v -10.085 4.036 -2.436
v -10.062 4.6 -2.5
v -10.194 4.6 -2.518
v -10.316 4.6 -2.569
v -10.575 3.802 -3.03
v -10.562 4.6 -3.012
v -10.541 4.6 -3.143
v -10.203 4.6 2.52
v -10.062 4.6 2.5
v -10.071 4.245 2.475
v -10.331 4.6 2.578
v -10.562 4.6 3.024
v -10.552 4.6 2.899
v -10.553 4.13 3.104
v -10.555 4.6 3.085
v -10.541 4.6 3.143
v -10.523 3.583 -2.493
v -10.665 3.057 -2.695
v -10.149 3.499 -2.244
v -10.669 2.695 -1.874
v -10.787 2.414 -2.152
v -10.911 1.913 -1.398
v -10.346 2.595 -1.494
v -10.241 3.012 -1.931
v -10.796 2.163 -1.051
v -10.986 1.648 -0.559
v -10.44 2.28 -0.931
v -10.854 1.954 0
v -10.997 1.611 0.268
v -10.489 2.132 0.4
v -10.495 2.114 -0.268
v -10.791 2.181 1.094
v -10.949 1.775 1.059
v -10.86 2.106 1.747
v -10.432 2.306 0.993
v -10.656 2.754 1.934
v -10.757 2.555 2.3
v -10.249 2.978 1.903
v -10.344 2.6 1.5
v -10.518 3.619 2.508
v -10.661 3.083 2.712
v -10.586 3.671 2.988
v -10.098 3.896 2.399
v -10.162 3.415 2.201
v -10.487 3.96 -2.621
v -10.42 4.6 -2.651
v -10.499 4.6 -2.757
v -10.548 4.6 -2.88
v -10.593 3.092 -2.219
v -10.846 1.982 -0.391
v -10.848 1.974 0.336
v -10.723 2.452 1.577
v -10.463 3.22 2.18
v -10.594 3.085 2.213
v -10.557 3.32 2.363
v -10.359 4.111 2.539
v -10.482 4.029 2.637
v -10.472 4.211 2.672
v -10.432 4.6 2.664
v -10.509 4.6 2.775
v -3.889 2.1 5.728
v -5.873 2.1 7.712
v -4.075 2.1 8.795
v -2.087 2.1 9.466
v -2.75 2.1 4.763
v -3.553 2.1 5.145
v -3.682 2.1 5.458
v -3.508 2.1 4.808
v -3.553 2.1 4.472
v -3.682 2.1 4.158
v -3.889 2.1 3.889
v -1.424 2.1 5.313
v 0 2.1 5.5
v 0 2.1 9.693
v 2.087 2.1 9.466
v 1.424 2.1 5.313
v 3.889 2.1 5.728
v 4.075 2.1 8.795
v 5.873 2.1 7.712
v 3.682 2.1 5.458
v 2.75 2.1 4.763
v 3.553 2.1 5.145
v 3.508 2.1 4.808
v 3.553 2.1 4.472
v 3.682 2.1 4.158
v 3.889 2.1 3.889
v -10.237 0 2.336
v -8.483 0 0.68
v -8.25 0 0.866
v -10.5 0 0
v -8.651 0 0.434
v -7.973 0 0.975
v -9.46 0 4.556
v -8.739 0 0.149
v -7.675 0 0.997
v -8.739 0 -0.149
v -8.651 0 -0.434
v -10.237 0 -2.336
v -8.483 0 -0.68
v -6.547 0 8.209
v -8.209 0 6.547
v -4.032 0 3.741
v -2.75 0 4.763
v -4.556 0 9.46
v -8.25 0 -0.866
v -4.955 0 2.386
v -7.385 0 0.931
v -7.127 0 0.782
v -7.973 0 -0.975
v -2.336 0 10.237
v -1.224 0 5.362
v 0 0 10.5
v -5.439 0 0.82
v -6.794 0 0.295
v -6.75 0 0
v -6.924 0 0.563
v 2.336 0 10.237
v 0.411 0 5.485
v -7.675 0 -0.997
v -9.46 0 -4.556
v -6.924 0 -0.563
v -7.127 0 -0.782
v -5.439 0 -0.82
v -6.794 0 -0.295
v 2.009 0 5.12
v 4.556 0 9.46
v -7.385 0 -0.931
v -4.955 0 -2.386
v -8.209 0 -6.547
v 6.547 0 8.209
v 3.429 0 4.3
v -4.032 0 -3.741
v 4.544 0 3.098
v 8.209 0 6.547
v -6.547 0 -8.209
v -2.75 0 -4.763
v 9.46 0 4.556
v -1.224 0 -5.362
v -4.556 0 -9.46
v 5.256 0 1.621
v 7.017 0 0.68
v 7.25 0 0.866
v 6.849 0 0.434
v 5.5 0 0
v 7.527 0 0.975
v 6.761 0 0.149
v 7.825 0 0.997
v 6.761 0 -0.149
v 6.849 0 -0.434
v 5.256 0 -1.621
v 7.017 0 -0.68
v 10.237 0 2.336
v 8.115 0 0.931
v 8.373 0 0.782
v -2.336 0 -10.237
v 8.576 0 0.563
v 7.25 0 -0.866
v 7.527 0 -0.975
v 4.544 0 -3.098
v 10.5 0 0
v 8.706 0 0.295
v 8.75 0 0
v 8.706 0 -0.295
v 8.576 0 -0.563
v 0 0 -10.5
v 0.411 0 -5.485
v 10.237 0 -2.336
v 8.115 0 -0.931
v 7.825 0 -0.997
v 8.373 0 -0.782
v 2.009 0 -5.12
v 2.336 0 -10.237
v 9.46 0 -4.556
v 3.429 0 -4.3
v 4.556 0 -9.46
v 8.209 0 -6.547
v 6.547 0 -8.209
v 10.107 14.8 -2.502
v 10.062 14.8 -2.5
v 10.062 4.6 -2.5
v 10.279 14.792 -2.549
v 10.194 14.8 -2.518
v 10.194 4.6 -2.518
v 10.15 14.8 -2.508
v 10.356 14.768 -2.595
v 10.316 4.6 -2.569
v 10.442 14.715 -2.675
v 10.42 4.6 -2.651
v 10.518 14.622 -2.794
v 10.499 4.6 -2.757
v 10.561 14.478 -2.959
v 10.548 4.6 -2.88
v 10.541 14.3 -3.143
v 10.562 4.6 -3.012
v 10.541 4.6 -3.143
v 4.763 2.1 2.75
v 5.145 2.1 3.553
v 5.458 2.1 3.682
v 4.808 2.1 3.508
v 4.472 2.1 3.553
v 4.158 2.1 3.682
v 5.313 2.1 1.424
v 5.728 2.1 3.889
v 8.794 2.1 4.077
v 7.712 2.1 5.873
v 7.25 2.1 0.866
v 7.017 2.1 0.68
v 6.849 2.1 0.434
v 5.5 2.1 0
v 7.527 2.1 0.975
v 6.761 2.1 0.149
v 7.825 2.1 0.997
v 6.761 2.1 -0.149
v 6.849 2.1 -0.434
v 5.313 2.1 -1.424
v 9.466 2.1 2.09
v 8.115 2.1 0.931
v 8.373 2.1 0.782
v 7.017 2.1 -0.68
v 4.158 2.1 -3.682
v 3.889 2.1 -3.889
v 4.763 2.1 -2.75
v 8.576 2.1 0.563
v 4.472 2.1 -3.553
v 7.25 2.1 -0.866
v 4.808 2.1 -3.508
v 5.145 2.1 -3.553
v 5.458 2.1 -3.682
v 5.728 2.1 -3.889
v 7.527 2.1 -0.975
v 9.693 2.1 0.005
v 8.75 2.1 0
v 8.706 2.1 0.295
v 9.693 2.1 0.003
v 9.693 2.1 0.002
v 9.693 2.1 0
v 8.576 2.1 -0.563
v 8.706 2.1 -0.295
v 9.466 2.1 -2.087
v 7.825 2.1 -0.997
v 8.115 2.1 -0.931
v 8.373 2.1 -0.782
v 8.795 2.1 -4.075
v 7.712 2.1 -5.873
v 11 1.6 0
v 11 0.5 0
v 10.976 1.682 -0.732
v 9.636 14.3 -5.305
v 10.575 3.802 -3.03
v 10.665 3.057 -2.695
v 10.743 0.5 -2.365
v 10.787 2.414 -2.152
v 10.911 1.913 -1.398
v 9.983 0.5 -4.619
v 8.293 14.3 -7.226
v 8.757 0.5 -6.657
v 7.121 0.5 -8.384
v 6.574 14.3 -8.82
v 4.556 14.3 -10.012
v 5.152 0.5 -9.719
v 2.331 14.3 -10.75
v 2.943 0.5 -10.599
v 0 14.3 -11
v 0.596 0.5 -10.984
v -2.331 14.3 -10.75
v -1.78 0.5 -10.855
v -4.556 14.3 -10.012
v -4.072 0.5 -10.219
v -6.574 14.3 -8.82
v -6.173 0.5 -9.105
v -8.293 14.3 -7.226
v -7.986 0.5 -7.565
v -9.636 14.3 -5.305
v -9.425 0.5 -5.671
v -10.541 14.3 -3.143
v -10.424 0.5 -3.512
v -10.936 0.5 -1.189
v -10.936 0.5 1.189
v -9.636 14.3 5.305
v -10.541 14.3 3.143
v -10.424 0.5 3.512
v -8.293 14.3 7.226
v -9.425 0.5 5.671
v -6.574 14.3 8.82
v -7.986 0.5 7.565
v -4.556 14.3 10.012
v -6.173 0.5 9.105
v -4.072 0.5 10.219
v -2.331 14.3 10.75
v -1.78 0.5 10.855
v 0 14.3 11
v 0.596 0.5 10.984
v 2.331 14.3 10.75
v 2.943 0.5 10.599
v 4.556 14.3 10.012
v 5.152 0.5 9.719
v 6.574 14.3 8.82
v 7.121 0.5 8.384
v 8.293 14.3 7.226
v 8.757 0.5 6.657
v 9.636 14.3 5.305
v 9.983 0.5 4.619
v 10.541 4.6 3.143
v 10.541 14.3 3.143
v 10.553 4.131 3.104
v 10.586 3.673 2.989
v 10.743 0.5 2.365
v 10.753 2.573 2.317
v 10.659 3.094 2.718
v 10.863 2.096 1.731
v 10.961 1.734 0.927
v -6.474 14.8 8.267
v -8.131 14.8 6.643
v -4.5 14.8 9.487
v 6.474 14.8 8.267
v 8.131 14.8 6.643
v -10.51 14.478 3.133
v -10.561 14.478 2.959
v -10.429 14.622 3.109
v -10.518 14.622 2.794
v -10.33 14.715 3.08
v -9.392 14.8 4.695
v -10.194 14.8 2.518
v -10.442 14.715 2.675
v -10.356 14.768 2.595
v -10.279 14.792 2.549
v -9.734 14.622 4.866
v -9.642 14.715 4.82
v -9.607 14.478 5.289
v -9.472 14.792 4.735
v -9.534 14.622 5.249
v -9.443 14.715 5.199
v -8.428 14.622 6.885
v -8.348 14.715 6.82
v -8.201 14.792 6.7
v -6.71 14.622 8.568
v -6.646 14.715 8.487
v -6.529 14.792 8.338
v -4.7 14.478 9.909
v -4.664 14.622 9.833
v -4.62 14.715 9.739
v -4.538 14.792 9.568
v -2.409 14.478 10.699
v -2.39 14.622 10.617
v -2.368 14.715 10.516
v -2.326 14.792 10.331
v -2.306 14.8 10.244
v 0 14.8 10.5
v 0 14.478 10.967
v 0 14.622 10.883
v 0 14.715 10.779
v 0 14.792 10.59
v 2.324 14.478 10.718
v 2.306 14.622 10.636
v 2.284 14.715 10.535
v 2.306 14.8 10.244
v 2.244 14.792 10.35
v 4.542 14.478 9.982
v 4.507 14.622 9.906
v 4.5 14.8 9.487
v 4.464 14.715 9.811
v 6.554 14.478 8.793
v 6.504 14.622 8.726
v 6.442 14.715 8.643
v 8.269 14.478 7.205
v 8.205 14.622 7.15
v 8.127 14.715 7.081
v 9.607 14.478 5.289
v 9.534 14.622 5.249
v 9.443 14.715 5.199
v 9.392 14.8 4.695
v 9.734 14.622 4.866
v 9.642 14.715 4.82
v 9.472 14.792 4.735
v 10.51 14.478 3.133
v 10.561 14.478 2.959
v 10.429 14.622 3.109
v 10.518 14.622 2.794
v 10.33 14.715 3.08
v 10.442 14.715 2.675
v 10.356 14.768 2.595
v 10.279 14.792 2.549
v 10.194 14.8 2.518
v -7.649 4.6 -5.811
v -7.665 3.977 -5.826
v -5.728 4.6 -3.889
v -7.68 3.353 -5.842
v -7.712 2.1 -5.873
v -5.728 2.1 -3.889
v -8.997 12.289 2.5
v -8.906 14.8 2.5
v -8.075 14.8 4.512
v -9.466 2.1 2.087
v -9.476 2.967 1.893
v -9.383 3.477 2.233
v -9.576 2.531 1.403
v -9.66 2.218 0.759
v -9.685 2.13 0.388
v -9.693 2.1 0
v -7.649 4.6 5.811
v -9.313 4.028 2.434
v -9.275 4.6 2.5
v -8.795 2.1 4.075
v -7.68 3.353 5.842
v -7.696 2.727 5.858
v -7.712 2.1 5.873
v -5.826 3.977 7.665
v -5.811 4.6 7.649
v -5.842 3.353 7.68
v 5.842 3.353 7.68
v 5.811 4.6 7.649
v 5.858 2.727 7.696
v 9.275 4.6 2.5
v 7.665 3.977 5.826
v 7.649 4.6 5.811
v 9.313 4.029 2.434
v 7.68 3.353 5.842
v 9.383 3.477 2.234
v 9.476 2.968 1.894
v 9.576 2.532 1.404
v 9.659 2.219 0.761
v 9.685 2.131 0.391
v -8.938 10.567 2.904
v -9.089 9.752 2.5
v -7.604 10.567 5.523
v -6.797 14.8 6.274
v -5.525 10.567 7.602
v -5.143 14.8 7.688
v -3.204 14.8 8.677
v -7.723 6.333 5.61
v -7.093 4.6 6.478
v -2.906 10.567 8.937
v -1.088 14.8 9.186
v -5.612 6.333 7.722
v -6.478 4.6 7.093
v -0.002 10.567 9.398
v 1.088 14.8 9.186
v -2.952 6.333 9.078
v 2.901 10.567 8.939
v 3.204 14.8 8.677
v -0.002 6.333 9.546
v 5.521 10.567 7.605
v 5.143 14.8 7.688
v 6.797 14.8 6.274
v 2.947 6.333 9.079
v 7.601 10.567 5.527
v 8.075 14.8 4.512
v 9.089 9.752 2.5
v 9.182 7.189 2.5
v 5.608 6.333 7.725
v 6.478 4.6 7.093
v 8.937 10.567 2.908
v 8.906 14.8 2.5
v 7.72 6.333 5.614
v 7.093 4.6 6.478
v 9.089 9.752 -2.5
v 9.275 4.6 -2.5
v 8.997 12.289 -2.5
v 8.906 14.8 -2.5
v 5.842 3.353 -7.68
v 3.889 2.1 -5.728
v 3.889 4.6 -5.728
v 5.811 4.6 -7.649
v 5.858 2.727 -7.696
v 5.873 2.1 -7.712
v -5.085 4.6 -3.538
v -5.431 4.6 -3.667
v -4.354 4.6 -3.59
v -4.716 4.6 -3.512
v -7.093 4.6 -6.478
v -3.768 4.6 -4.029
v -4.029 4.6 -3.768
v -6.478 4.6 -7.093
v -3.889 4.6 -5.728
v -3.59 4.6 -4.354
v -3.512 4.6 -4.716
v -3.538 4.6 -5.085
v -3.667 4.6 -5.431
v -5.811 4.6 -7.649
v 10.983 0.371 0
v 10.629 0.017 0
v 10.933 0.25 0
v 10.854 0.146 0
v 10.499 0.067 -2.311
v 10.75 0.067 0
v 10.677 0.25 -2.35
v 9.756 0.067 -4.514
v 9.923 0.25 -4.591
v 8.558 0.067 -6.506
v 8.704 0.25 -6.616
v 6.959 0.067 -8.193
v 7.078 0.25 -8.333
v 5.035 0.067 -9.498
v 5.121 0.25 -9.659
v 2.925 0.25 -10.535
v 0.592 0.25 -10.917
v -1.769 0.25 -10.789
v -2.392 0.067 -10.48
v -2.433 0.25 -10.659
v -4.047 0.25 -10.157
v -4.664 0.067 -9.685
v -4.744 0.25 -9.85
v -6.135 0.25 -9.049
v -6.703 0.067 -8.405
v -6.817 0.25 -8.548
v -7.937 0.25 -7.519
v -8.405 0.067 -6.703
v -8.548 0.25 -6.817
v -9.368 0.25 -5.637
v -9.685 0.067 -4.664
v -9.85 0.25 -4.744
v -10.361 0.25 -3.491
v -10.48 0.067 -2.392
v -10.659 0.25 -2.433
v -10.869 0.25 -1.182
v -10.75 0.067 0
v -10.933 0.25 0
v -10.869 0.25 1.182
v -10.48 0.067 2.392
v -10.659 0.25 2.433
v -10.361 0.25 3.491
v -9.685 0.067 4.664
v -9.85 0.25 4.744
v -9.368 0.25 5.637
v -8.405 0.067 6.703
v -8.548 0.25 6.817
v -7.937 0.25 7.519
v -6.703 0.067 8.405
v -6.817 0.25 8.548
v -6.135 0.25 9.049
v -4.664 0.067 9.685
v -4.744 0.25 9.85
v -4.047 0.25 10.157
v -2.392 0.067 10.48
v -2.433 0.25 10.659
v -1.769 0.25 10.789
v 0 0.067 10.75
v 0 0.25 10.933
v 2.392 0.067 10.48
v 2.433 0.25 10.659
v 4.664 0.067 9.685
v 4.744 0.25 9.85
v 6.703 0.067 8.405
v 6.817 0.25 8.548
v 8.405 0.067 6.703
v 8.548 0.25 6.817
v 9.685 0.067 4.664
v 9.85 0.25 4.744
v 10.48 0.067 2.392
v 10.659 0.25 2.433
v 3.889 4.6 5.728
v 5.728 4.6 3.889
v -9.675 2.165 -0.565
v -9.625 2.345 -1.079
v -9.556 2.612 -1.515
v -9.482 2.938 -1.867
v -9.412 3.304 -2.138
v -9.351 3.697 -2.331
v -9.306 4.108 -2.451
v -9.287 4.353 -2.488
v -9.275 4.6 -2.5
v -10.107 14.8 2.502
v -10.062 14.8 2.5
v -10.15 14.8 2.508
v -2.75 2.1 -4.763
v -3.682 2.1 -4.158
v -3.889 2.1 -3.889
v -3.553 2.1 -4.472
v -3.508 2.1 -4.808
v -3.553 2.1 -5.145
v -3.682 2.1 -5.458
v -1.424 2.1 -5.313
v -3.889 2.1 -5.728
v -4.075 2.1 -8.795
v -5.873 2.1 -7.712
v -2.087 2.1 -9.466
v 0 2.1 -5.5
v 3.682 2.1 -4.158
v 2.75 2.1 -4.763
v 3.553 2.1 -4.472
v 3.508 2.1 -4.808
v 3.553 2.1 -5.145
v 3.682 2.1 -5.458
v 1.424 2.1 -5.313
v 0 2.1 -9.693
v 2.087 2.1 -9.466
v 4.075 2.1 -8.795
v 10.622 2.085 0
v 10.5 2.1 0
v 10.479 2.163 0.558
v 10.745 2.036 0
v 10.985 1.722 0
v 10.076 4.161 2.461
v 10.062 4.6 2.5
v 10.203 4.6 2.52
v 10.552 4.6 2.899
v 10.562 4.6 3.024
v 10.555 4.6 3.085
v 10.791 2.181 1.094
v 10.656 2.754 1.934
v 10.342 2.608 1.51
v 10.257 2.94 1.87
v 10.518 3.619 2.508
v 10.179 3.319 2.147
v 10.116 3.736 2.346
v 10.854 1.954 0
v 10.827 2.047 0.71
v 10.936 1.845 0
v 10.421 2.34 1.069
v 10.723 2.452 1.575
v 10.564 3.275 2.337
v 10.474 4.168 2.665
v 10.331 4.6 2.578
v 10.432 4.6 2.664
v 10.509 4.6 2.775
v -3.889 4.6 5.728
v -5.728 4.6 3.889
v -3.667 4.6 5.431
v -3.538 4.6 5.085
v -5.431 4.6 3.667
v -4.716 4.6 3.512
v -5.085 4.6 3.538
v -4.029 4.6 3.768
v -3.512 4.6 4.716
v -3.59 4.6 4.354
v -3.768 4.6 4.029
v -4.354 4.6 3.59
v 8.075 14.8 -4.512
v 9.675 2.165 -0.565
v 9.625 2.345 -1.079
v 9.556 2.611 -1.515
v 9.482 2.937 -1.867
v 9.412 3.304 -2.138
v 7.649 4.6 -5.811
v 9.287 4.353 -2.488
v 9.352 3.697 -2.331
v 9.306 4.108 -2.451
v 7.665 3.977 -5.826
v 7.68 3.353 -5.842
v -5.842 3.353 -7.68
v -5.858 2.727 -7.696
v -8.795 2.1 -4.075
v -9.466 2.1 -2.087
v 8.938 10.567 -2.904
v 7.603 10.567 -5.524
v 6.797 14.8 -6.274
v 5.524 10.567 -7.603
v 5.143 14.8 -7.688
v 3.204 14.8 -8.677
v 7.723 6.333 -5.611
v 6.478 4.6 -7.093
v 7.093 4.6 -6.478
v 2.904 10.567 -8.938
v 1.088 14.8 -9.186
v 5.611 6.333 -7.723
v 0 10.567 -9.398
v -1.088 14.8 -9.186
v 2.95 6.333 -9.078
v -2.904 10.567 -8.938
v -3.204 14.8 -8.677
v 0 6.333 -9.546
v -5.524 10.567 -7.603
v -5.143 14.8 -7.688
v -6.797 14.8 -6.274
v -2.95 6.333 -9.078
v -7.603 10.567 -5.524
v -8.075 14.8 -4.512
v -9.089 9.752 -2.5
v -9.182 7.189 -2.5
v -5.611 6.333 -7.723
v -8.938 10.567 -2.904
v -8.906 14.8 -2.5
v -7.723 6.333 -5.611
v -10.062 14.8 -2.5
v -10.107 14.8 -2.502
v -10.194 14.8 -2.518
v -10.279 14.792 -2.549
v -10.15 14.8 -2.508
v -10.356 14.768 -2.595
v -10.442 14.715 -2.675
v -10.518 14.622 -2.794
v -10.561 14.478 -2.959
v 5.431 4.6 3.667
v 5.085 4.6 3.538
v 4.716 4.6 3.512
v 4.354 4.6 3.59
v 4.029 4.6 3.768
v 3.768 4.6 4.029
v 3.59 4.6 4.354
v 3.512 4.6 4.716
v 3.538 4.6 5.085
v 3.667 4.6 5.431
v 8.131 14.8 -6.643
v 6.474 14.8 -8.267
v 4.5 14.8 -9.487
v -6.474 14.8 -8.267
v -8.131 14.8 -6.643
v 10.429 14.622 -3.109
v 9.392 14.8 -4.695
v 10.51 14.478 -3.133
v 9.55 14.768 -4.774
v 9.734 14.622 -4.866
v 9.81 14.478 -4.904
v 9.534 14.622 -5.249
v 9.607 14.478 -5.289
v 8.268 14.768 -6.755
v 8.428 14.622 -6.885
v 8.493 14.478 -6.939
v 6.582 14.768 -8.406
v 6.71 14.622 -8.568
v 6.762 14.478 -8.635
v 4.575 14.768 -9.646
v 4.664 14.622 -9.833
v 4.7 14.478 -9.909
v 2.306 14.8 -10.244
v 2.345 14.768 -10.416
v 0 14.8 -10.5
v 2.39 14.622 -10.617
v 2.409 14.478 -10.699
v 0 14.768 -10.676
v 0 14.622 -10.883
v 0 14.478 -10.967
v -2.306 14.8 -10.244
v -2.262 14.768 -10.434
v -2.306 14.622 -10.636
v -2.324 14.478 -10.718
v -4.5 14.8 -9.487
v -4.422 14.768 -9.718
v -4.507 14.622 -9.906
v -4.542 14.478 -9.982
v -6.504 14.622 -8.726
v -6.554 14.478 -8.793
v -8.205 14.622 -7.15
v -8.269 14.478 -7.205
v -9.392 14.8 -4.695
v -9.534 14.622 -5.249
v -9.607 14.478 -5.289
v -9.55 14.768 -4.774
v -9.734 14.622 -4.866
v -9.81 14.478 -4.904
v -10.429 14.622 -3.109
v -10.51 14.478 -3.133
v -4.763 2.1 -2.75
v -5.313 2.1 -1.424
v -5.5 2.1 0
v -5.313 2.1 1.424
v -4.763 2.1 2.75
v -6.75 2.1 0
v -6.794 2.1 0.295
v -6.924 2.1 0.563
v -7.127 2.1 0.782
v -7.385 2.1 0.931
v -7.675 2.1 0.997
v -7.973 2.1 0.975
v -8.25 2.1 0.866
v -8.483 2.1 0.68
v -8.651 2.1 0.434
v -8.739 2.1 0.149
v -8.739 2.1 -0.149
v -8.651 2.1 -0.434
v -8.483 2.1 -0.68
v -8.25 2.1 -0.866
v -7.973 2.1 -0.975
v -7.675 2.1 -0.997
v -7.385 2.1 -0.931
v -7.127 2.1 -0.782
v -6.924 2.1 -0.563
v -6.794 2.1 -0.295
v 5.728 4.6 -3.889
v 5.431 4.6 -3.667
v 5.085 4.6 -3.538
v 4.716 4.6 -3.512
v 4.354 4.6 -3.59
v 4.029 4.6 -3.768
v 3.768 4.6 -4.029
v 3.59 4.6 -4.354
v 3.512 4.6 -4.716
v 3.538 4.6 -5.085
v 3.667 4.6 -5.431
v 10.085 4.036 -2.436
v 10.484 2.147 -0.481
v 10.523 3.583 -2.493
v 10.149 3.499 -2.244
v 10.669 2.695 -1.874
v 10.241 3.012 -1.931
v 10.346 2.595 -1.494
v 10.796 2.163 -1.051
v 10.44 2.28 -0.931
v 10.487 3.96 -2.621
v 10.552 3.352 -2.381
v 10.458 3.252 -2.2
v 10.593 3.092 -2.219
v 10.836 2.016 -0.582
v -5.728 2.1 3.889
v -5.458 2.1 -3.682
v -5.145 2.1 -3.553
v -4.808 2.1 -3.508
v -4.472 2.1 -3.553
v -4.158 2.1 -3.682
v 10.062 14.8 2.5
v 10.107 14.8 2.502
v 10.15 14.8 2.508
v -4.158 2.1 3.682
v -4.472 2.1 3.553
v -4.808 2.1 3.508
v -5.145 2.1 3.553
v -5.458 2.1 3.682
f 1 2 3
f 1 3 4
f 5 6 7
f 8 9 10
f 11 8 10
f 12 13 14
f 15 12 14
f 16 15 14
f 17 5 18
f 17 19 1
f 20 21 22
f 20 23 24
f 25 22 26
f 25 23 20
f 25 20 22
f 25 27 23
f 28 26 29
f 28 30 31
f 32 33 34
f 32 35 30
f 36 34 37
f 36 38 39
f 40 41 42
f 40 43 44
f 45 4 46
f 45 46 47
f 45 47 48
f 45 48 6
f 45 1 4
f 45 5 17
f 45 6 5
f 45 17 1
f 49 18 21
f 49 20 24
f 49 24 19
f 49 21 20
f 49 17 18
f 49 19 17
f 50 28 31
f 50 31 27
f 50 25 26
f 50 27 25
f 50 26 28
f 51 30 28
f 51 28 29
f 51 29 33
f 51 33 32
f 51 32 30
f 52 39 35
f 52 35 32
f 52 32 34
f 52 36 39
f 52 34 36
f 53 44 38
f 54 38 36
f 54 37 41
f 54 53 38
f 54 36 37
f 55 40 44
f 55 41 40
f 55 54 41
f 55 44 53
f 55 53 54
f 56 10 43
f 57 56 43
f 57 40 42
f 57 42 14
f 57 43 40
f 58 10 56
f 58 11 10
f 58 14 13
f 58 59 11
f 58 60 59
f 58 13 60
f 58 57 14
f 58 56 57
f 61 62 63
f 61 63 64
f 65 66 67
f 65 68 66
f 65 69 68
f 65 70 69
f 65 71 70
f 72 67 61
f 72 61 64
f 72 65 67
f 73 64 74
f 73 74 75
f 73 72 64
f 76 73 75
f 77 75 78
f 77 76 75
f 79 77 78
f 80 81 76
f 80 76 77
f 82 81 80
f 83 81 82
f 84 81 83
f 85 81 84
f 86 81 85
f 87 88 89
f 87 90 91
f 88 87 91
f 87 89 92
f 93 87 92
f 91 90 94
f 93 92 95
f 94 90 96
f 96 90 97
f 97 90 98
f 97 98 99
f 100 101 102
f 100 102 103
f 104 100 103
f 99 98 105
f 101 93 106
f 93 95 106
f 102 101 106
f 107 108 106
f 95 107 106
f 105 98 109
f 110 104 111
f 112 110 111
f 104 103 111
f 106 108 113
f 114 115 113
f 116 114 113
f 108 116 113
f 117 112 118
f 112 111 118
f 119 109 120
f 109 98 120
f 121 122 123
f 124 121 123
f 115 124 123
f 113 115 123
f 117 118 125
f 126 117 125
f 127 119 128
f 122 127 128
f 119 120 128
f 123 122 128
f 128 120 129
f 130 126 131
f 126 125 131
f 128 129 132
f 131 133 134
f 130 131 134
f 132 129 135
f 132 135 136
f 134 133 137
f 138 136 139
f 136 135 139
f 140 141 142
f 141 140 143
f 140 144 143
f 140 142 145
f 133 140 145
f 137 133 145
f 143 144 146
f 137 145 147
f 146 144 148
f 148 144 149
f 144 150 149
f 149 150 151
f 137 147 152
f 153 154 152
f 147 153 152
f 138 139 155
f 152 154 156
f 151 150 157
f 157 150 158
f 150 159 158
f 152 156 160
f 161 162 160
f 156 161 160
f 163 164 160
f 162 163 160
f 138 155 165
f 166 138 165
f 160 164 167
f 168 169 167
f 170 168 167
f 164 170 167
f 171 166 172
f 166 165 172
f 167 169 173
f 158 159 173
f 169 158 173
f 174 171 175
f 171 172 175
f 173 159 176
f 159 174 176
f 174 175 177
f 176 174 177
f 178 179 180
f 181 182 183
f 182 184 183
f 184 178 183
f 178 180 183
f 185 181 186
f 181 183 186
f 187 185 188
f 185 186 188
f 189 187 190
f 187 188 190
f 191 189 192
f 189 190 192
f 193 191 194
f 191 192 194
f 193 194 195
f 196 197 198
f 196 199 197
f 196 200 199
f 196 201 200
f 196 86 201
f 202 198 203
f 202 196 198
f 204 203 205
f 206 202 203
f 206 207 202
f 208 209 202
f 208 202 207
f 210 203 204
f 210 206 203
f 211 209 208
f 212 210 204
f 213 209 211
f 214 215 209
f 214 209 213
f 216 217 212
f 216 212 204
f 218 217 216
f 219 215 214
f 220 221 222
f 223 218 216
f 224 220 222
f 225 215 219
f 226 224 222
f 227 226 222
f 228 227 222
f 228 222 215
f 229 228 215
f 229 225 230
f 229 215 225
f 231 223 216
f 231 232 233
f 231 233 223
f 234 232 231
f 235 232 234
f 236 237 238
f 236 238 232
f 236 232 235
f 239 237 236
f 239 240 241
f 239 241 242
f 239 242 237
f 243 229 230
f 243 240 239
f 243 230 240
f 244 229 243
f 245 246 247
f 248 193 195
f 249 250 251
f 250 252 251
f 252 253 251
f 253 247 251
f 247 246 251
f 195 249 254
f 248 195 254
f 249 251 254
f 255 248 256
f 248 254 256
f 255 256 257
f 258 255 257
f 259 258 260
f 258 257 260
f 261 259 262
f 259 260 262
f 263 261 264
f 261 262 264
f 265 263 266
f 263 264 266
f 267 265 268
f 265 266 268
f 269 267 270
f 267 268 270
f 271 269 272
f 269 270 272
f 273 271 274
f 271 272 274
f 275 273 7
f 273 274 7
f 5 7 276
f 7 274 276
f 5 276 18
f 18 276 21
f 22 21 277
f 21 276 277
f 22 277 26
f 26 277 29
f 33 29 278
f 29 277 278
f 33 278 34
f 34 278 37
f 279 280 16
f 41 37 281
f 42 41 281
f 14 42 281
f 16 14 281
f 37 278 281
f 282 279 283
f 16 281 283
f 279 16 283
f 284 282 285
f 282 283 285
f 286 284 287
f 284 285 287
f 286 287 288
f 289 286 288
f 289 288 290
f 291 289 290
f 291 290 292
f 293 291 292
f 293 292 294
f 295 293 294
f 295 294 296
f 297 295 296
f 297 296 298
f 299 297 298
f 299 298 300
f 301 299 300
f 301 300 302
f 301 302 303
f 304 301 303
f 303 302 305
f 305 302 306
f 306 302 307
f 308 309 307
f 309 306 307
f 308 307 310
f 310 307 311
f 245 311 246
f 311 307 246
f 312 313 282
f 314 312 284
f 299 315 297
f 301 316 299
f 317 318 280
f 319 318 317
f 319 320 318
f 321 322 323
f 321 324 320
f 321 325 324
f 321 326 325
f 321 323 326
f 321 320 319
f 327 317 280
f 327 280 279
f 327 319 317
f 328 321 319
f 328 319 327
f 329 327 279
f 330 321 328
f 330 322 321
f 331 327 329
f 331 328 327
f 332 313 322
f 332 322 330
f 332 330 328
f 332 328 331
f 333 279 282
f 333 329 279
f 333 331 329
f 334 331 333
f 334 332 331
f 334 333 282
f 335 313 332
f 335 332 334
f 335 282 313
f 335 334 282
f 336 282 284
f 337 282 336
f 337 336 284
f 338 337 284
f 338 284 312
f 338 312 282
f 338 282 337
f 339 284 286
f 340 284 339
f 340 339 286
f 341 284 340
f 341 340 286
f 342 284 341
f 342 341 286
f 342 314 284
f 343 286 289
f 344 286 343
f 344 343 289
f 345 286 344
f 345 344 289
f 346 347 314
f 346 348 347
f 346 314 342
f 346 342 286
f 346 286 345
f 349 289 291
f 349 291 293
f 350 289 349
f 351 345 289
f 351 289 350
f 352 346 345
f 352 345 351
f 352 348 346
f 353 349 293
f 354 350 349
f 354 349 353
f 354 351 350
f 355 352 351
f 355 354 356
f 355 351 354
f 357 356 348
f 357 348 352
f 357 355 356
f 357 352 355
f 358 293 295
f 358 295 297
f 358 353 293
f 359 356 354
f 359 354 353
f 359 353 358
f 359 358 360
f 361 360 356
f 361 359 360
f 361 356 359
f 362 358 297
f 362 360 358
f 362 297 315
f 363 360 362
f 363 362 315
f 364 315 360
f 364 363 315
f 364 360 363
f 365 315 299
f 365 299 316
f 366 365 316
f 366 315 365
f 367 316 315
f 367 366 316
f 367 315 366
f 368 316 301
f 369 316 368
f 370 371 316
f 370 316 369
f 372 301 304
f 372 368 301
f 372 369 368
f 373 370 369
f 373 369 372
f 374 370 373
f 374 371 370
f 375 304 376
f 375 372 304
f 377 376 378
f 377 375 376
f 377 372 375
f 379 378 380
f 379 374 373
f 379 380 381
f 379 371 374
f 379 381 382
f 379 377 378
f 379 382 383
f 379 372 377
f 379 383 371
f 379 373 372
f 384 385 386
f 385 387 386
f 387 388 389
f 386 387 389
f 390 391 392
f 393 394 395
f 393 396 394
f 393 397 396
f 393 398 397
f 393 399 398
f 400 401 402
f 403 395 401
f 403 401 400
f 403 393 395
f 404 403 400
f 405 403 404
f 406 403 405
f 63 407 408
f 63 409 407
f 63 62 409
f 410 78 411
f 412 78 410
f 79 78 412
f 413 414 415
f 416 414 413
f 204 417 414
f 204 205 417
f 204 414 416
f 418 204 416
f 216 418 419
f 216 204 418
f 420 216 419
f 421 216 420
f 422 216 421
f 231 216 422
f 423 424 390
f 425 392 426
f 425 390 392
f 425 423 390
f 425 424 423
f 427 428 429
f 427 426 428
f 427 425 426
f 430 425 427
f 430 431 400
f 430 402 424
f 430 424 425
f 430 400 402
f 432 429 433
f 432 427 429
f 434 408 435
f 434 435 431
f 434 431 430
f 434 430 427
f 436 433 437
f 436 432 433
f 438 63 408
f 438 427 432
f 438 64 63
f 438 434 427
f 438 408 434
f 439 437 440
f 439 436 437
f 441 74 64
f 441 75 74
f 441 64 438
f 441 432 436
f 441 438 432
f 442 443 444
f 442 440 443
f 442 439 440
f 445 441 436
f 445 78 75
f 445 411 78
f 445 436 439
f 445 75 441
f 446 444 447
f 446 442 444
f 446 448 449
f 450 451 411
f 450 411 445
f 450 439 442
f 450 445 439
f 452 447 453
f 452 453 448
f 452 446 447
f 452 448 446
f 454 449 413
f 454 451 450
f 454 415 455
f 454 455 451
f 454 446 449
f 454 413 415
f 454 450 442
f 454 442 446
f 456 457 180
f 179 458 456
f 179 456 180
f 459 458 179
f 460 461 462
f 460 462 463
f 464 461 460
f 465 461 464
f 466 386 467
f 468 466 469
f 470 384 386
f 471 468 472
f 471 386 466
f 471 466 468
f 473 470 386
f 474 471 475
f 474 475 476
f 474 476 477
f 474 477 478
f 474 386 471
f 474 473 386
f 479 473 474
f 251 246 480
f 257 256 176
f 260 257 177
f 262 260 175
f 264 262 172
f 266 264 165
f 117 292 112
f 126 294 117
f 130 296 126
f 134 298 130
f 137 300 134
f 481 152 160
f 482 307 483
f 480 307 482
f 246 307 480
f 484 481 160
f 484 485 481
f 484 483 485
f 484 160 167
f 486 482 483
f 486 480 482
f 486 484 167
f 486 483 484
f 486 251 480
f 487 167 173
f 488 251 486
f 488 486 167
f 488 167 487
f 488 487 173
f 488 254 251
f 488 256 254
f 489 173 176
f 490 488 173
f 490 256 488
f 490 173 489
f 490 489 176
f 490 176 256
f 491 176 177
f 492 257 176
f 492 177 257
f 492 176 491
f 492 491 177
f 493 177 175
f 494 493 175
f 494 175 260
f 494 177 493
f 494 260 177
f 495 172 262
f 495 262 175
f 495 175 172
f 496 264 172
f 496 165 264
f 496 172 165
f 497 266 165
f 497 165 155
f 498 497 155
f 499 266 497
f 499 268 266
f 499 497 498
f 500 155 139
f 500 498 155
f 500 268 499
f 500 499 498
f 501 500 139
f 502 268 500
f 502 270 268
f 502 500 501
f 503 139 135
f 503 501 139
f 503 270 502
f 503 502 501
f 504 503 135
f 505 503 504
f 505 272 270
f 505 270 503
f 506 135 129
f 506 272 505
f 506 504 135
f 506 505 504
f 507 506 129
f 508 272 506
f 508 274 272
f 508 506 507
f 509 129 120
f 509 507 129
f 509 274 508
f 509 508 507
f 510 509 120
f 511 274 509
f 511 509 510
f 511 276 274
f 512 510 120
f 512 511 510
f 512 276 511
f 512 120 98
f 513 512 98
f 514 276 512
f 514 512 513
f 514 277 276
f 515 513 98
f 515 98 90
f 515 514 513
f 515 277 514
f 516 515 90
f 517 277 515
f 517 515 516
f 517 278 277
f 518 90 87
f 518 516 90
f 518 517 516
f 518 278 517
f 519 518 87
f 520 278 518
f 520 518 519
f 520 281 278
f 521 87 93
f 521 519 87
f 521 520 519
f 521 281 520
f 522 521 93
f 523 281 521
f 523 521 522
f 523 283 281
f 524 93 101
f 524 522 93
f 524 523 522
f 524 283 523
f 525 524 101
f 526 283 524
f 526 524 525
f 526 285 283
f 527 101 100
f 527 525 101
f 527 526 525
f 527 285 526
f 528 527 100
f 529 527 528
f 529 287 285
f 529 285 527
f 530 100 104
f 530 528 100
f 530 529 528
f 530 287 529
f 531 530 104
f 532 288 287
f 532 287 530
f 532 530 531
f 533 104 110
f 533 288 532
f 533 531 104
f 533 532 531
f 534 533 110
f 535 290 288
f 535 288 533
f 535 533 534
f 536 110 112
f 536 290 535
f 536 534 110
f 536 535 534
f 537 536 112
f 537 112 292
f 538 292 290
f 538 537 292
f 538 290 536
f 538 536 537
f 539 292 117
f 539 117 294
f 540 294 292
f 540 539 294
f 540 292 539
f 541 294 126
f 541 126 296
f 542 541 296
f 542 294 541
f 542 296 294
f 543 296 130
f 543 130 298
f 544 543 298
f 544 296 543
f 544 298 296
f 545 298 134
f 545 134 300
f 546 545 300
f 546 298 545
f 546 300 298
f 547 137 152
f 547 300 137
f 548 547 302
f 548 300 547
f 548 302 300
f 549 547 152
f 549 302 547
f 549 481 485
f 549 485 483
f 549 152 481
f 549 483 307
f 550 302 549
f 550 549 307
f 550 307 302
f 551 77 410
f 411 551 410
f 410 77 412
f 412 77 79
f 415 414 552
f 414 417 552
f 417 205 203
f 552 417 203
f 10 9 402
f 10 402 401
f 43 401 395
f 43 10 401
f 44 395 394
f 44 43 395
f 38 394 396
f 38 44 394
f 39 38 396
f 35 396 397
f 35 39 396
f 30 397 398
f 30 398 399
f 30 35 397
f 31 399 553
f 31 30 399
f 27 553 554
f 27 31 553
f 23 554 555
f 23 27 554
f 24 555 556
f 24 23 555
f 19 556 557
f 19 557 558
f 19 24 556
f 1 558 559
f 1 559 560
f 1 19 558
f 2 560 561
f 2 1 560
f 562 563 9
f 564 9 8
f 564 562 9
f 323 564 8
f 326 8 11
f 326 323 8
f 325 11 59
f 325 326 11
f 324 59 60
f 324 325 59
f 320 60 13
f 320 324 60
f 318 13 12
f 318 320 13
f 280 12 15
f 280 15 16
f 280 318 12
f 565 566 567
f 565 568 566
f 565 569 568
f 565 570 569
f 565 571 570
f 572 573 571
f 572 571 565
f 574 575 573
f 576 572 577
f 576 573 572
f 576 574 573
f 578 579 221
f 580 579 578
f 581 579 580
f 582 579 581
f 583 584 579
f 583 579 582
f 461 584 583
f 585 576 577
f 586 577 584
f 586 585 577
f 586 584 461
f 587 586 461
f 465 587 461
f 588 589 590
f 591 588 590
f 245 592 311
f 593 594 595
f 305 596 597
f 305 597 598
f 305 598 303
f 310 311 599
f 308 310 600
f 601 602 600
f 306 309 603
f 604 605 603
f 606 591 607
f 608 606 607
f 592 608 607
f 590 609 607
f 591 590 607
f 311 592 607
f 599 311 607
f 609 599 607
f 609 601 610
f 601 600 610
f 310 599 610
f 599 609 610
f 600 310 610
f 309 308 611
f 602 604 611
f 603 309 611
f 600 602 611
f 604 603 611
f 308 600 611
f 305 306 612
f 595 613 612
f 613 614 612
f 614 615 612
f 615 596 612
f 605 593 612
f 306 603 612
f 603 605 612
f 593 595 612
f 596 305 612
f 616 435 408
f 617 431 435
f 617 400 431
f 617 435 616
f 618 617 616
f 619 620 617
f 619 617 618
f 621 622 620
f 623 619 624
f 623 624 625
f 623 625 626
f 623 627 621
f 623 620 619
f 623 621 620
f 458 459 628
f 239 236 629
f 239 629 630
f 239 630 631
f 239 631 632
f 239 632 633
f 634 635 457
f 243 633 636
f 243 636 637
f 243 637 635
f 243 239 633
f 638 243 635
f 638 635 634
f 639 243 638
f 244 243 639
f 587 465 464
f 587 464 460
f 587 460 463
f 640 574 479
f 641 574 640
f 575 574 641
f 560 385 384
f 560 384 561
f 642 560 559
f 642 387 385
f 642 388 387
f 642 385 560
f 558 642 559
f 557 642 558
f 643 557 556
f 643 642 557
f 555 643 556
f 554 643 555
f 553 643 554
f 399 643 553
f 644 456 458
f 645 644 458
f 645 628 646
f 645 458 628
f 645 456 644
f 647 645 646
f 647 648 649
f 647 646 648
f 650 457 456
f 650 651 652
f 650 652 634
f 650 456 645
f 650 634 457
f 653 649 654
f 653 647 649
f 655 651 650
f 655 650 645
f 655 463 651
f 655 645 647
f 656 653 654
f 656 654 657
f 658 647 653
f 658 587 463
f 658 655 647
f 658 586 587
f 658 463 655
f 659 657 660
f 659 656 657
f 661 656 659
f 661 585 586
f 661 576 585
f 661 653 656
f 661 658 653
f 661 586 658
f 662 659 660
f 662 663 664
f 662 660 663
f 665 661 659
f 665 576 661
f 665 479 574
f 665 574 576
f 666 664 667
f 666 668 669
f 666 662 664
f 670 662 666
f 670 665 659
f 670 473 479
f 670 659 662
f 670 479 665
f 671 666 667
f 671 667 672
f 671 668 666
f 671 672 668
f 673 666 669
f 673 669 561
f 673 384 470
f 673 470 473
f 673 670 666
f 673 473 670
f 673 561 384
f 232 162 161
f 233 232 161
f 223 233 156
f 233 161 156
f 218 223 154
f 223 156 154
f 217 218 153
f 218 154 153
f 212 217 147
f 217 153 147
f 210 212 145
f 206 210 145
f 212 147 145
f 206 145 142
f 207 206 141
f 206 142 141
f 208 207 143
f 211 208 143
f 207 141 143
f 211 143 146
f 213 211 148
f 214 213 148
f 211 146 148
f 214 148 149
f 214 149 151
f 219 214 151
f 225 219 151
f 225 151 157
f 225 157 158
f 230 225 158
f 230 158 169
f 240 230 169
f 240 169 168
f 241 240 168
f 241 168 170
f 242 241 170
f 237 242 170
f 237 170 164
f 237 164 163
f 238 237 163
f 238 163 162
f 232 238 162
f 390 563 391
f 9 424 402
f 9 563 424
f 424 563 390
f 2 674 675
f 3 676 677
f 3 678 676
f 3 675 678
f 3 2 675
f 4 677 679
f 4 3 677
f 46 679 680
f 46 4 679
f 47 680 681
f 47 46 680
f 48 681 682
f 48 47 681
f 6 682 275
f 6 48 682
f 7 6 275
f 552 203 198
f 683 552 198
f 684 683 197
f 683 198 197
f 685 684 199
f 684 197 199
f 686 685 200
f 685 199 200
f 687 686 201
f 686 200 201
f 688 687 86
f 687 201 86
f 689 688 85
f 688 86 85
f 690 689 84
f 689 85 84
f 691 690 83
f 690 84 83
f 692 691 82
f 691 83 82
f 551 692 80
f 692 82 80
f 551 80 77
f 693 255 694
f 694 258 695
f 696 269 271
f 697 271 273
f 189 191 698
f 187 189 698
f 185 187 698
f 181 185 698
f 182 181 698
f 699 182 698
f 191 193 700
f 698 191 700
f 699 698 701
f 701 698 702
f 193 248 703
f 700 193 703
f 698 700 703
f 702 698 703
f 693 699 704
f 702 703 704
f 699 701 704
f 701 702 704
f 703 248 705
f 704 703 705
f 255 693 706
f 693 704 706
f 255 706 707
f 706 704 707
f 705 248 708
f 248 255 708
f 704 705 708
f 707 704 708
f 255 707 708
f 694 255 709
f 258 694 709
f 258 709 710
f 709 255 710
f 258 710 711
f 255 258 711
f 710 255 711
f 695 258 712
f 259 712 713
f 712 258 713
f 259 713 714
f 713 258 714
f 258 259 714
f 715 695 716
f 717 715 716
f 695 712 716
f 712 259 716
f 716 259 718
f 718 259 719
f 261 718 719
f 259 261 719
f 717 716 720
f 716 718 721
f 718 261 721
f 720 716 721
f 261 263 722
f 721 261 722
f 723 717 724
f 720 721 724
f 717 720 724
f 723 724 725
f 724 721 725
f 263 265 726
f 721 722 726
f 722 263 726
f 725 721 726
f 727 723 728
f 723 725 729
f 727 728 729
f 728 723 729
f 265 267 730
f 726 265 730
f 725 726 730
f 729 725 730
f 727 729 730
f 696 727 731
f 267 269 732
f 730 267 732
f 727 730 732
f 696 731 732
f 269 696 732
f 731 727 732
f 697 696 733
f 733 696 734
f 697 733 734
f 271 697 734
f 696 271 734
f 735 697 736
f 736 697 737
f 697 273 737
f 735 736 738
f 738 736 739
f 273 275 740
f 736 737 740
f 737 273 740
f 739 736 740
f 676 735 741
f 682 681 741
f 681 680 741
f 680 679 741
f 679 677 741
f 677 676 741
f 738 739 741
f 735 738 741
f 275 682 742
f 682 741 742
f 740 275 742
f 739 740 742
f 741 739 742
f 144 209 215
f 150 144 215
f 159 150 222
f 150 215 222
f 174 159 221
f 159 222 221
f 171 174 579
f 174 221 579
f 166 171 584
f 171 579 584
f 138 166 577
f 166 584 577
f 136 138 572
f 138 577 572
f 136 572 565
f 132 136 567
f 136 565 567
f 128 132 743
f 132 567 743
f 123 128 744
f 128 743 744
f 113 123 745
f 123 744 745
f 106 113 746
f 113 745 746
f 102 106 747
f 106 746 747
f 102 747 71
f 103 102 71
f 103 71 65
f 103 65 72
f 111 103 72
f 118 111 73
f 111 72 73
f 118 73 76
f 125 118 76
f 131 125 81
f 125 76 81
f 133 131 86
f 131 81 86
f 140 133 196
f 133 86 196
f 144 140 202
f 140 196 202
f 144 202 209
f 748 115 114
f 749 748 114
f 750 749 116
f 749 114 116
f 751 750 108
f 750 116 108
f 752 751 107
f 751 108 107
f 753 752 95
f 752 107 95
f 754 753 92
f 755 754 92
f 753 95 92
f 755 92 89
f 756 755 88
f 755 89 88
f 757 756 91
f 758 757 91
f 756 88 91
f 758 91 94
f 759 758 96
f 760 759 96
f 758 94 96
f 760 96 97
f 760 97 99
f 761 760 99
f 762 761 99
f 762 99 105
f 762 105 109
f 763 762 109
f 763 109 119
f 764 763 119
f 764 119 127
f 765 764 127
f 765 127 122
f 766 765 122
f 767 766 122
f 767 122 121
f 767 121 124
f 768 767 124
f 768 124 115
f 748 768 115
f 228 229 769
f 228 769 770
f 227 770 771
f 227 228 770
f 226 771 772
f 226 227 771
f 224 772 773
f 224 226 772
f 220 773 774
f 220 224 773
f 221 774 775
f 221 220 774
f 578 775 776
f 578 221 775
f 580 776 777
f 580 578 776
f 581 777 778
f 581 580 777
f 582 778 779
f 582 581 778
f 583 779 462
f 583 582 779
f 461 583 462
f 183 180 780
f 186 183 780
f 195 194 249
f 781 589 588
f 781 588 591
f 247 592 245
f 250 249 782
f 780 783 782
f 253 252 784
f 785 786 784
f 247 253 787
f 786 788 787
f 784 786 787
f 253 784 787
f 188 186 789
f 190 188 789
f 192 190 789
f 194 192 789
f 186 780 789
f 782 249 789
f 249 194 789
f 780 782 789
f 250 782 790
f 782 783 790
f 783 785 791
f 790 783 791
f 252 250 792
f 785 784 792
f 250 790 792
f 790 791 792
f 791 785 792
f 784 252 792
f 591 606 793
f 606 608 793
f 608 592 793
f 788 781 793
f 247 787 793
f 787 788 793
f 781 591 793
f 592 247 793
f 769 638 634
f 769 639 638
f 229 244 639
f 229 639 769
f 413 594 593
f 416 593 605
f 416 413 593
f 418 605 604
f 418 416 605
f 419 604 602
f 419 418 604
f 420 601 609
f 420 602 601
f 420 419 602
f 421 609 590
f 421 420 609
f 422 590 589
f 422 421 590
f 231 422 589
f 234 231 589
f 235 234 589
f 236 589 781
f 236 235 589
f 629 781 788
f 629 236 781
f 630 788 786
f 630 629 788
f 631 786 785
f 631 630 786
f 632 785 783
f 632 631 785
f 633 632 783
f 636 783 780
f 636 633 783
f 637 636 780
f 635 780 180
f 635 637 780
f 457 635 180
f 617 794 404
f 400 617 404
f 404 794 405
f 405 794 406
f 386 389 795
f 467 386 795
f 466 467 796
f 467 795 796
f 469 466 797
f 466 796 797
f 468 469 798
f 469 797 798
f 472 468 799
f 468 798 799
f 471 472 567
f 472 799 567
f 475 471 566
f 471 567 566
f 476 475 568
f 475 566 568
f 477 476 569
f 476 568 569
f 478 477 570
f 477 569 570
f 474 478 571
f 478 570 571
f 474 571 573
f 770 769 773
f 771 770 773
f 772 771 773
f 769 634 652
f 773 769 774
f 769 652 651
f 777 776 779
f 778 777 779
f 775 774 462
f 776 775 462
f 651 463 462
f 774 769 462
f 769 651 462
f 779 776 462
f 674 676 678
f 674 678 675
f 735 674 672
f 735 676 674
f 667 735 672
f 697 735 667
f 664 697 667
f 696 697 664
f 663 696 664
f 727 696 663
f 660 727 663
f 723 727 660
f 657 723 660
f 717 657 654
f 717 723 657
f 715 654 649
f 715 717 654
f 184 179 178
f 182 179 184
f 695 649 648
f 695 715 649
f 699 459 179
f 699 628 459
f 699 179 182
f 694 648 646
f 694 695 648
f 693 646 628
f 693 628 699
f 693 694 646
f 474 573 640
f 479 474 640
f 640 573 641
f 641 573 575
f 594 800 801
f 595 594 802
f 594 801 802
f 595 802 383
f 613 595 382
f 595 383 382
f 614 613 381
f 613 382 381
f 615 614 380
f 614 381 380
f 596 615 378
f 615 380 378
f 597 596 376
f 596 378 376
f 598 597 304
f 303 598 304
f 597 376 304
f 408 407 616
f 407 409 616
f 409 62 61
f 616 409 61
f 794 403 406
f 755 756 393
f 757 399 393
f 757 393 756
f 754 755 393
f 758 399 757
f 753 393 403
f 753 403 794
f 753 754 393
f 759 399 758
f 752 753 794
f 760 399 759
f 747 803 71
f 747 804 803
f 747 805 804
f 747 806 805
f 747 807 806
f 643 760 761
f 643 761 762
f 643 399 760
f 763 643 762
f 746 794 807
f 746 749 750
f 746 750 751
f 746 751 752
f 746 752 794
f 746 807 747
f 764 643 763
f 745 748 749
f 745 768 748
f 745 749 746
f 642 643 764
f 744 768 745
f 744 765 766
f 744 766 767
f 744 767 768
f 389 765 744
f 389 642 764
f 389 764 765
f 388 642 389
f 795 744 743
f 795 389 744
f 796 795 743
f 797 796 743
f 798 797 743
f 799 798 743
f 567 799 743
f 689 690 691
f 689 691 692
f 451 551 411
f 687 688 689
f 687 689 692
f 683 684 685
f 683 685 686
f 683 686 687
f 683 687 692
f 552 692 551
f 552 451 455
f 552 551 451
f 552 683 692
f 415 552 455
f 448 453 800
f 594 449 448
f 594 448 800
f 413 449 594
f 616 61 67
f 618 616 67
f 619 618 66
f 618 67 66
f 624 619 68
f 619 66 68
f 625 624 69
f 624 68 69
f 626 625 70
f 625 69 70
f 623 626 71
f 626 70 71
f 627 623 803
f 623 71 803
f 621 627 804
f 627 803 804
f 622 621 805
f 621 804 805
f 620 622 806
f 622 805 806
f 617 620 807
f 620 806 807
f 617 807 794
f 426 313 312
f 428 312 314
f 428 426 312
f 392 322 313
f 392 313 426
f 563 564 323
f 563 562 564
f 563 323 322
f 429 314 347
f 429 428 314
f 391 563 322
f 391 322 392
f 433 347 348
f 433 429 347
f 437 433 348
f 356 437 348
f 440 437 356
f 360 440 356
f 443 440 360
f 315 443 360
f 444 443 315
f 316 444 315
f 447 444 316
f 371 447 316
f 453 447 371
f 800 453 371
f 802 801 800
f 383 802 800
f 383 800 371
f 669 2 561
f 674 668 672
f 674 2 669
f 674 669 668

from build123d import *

# Parameters (mm, degrees)
SKETCH1_R           = 11
BOSS_EXTRUDE1_DEPTH = 14.8
SKETCH2_R           = 9.25
CUT_EXTRUDE1_DEPTH  = 12.7
CUT_EXTRUDE1_TAPER  = -2
CUT_EXTRUDE2_REACH  = 4.1
SKETCH3_R           = 5.5
BOSS_EXTRUDE2_DEPTH = 2.5
CUT_EXTRUDE3_DEPTH  = 23
CUT_EXTRUDE4_REACH  = 16.8
SKETCH7_R           = 1
FILLET1_R           = 0.5


with BuildPart() as part:
    # Sketch1 → Boss-Extrude1 (new body)
    with BuildSketch(Plane(origin=(0, 0, 0), x_dir=(1, 0, 0), z_dir=(0, 1, 0))):
        Circle(SKETCH1_R)
    extrude(amount=BOSS_EXTRUDE1_DEPTH)

    # Sketch2 → Cut-Extrude1 (cut)
    with BuildSketch(Plane(origin=(0, 14.8, 0), x_dir=(1, 0, 0), z_dir=(0, 1, 0))):
        Circle(SKETCH2_R)
    extrude(amount=-CUT_EXTRUDE1_DEPTH, taper=CUT_EXTRUDE1_TAPER, mode=Mode.SUBTRACT)

    # Sketch3 → Cut-Extrude2 (cut, up to next)
    with BuildSketch(Plane(origin=(0, 2.1, 0), x_dir=(1, 0, 0), z_dir=(0, 1, 0)), mode=Mode.PRIVATE) as cut_extrude2_sk1:
        Circle(SKETCH3_R)
    cut_extrude2_tool1 = extrude(cut_extrude2_sk1.sketch, amount=-CUT_EXTRUDE2_REACH, mode=Mode.PRIVATE) & part.part
    add(cut_extrude2_tool1.solids().sort_by_distance((0, 2.1, 0))[0], mode=Mode.SUBTRACT)

    # Sketch4 → Boss-Extrude2 (add)
    with BuildSketch(Plane(origin=(0, 2.1, 0), x_dir=(1, 0, 0), z_dir=(0, 1, 0))):
        with BuildLine():
            Line((3.889087297, 5.727564928), (5.873176864, 7.711654495))
            ThreePointArc((5.873176864, 7.711654495), (6.85433518, 6.85433518), (7.711654495, 5.873176864))
            Line((7.711654495, 5.873176864), (5.727564928, 3.889087297))
            ThreePointArc((5.727564928, 3.889087297), (3.889087297, 3.889087297), (3.889087297, 5.727564928))
        make_face()
        with BuildLine():
            Line((3.889087297, -5.727564928), (5.873176864, -7.711654495))
            ThreePointArc((5.873176864, -7.711654495), (6.85433518, -6.85433518), (7.711654495, -5.873176864))
            Line((7.711654495, -5.873176864), (5.727564928, -3.889087297))
            ThreePointArc((5.727564928, -3.889087297), (3.889087297, -3.889087297), (3.889087297, -5.727564928))
        make_face()
        with BuildLine():
            Line((-5.727564928, -3.889087297), (-7.711654495, -5.873176864))
            ThreePointArc((-7.711654495, -5.873176864), (-6.85433518, -6.85433518), (-5.873176864, -7.711654495))
            Line((-5.873176864, -7.711654495), (-3.889087297, -5.727564928))
            ThreePointArc((-3.889087297, -5.727564928), (-3.889087297, -3.889087297), (-5.727564928, -3.889087297))
        make_face()
        with BuildLine():
            Line((-3.889087297, 5.727564928), (-5.873176864, 7.711654495))
            ThreePointArc((-5.873176864, 7.711654495), (-6.85433518, 6.85433518), (-7.711654495, 5.873176864))
            Line((-7.711654495, 5.873176864), (-5.727564928, 3.889087297))
            ThreePointArc((-5.727564928, 3.889087297), (-3.889087297, 3.889087297), (-3.889087297, 5.727564928))
        make_face()
    extrude(amount=BOSS_EXTRUDE2_DEPTH)

    # Sketch6 → Cut-Extrude3 (cut, through all)
    with BuildSketch(Plane.ZY.offset(11)):
        with BuildLine():
            Line((-2.5, 4.6), (-2.5, 14.8))
            Line((-2.5, 14.8), (2.5, 14.8))
            Line((2.5, 14.8), (2.5, 4.6))
            ThreePointArc((2.5, 4.6), (0, 2.1), (-2.5, 4.6))
        make_face()
    extrude(amount=-CUT_EXTRUDE3_DEPTH, mode=Mode.SUBTRACT)

    # Sketch7 → Cut-Extrude4 (cut, up to next)
    with BuildSketch(Plane.XZ, mode=Mode.PRIVATE) as cut_extrude4_sk1:
        with Locations((7.75, 0)):
            Circle(SKETCH7_R)
    cut_extrude4_tool1 = extrude(cut_extrude4_sk1.sketch, amount=-CUT_EXTRUDE4_REACH, mode=Mode.PRIVATE) & part.part
    add(cut_extrude4_tool1.solids().sort_by_distance((7.75, 0, 0))[0], mode=Mode.SUBTRACT)
    # Sketch7 → Cut-Extrude4 (cut, up to next)
    with BuildSketch(Plane.XZ, mode=Mode.PRIVATE) as cut_extrude4_sk2:
        with Locations((-7.75, 0)):
            Circle(SKETCH7_R)
    cut_extrude4_tool2 = extrude(cut_extrude4_sk2.sketch, amount=-CUT_EXTRUDE4_REACH, mode=Mode.PRIVATE) & part.part
    add(cut_extrude4_tool2.solids().sort_by_distance((-7.75, 0, 0))[0], mode=Mode.SUBTRACT)

    # Fillet1
    fillet1_edges = [part.edges().sort_by_distance(p)[0] for p in [
        (-11, 0, 0),
        (0, 14.8, -11),
        (0, 14.8, 11),
        (-10.712142643, 9.7, -2.5),
        (10.712142643, 9.7, -2.5),
        (-10.712142643, 9.7, 2.5),
        (10.712142643, 9.7, 2.5),
        (10.857017021, 2.832284274, 1.767818206),
        (-11, 2.1, 0),
    ]]
    fillet(fillet1_edges, radius=FILLET1_R)


solid = part.part
